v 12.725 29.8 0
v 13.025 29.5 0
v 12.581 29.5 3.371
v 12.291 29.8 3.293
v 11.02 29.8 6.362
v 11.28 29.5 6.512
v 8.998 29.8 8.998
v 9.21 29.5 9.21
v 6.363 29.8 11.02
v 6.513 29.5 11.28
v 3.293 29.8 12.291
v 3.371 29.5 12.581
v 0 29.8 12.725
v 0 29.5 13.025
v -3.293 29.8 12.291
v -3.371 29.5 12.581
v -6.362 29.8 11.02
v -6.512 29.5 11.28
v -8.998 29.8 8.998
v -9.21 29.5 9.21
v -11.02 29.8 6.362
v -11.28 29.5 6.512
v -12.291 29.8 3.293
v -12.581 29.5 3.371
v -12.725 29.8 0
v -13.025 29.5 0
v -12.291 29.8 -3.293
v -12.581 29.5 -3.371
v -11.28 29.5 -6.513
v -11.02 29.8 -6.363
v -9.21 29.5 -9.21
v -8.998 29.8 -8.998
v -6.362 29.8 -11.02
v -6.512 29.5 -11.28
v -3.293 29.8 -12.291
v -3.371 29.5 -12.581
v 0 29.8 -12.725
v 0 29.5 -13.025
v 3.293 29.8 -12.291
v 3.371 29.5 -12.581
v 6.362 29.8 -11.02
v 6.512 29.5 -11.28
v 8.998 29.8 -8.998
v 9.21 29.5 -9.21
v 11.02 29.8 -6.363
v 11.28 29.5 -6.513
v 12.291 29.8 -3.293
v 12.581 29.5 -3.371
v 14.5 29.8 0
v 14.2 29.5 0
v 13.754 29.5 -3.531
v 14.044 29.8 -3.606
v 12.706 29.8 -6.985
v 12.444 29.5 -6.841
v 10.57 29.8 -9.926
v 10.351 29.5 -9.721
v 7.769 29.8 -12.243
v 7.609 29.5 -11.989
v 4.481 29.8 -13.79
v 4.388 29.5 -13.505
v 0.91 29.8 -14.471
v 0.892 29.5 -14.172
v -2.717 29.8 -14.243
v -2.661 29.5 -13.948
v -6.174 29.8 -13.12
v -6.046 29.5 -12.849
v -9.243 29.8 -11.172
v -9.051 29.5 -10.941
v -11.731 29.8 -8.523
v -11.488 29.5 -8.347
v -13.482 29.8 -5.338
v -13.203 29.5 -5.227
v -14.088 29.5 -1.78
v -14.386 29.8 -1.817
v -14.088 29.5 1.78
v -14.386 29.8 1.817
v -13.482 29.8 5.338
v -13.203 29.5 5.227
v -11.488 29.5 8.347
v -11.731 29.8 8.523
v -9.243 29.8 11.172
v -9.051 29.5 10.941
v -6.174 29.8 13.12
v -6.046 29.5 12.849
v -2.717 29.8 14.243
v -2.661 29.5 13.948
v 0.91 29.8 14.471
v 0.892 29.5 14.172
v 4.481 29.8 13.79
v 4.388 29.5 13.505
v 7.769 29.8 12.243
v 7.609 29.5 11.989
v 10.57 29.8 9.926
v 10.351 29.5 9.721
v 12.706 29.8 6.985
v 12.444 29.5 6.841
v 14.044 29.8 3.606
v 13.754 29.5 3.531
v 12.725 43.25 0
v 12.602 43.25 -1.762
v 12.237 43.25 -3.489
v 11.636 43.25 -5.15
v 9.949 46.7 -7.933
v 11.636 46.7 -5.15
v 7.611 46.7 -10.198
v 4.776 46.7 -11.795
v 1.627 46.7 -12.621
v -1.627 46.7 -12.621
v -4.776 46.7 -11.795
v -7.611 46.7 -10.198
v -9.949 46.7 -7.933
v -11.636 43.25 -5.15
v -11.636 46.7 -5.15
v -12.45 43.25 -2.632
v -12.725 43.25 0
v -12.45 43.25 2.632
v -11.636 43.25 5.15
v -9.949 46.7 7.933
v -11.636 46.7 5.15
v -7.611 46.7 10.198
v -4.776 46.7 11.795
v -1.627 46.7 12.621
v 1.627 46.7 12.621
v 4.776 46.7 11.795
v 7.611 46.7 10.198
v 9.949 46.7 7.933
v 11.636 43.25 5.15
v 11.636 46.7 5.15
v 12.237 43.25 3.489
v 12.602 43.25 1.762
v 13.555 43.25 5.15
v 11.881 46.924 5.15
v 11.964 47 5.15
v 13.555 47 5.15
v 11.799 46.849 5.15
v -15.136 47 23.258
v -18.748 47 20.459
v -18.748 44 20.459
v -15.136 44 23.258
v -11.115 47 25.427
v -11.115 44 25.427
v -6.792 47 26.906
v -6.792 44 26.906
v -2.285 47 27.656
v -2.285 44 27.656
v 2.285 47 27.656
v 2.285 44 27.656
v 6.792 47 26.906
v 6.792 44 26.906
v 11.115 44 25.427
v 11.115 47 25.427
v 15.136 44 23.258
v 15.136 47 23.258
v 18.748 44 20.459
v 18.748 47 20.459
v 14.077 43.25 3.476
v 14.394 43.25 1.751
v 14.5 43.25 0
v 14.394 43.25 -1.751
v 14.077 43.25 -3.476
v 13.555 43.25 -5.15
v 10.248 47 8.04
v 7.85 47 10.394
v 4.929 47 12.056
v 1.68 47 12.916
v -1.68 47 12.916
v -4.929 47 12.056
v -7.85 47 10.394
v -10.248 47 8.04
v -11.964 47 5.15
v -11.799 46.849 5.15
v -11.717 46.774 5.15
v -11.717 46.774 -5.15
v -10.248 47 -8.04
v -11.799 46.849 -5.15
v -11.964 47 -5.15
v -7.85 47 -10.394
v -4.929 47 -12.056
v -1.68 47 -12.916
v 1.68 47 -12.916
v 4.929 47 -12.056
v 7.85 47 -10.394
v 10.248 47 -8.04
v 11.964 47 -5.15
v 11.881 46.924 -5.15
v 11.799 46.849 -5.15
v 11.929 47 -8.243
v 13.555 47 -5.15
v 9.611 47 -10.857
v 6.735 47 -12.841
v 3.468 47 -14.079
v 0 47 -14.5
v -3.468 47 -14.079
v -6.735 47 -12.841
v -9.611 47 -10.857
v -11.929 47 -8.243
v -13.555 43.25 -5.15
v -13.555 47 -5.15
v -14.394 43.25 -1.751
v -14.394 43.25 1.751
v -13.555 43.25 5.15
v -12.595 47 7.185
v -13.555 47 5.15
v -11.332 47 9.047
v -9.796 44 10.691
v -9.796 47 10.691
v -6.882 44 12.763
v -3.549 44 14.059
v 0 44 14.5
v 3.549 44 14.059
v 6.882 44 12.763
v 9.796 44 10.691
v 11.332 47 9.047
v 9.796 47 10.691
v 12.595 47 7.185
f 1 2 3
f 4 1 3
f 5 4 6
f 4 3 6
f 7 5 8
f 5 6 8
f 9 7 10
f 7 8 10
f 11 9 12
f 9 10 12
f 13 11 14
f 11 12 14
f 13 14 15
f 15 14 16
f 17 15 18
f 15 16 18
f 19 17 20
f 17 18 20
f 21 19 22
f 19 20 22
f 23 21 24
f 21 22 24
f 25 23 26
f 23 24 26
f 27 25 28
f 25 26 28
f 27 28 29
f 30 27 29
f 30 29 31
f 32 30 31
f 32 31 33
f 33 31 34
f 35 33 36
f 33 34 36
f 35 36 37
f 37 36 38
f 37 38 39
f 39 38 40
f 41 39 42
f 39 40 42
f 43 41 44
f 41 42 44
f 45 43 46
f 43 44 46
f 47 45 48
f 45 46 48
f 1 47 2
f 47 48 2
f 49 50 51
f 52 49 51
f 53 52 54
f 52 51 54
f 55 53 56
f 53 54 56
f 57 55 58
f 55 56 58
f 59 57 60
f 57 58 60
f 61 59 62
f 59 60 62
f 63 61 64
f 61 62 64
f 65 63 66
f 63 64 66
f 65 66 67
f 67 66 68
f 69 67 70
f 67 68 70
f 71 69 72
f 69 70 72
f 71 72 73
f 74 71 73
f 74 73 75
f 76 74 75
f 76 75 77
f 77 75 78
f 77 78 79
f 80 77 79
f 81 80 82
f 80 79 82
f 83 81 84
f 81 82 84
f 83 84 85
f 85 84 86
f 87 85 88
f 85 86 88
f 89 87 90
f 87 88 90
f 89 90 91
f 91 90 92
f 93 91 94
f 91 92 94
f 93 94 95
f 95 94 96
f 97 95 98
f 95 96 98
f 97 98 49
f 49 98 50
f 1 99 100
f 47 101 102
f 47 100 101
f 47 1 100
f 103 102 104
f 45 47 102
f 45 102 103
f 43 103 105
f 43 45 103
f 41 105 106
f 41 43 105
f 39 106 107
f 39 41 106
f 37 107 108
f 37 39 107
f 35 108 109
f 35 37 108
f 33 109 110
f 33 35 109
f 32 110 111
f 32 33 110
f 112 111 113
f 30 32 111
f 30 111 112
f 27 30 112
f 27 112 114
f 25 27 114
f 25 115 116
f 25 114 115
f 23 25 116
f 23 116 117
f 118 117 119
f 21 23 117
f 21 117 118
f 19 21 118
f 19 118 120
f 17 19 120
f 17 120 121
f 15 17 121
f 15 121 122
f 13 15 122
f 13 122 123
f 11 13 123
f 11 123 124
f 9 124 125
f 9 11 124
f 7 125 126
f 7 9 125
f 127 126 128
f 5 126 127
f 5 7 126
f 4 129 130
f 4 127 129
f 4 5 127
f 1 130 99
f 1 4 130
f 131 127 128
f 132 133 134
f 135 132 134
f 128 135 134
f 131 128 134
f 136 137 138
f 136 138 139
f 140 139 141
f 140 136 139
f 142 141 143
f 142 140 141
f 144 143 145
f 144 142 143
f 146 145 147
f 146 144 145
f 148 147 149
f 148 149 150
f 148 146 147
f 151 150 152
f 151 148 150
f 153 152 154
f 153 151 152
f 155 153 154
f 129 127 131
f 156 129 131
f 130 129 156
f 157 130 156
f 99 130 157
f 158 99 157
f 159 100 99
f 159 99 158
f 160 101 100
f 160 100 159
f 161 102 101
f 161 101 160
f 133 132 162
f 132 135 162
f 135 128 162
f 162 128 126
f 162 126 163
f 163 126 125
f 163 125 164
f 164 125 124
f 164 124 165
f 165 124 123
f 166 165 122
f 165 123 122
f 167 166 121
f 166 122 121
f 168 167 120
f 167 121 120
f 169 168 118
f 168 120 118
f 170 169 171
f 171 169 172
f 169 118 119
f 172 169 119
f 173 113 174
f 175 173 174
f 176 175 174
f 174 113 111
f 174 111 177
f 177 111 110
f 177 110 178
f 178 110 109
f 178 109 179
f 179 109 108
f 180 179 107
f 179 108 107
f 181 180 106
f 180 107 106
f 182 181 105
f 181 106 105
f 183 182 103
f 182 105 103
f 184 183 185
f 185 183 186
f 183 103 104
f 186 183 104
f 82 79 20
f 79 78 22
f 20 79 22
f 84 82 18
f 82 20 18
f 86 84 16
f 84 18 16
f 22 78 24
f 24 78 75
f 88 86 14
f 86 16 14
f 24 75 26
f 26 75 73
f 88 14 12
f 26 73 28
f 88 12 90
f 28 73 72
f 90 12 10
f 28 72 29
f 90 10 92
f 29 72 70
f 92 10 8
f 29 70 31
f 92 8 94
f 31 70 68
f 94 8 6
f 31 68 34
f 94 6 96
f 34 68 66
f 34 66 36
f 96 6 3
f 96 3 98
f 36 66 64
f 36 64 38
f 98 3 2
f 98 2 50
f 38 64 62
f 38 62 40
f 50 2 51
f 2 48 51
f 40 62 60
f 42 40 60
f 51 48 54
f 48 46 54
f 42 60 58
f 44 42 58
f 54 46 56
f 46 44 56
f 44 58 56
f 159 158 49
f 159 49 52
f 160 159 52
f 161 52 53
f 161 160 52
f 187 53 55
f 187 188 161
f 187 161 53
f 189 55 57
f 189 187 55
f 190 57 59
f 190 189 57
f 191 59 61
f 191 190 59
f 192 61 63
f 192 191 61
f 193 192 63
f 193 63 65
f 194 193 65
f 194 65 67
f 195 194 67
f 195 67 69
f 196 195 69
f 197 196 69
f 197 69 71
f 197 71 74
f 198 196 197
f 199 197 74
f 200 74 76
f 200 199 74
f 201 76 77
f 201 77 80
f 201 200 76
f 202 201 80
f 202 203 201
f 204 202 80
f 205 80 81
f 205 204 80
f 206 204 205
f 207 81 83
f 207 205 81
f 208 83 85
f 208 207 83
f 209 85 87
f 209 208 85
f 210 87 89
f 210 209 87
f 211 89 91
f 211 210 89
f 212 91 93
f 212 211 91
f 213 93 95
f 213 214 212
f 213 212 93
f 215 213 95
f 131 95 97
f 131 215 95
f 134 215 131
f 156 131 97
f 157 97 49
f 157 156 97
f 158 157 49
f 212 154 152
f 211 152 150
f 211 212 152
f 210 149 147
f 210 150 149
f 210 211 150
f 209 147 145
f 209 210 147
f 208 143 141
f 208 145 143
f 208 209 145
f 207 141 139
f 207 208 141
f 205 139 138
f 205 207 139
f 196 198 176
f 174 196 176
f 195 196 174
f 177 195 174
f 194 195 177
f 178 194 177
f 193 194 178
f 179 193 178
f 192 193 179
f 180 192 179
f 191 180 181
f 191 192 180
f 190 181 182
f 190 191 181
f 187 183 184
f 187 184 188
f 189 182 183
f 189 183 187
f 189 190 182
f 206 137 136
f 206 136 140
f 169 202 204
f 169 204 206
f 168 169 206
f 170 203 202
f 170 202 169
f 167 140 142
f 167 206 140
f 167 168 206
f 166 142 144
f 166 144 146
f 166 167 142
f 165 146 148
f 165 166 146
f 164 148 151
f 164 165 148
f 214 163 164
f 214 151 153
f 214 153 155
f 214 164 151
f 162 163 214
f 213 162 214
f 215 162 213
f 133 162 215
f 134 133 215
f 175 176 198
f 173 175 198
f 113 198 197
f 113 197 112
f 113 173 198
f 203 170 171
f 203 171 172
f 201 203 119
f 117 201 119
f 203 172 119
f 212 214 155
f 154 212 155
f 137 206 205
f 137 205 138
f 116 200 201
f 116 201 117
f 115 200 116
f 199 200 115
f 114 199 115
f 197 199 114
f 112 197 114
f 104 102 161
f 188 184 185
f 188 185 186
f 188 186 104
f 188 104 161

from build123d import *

# Parameters (mm, degrees)
SKETCH136_R             = 14.5
PAD078_DEPTH            = 17.5
PAD079_DEPTH            = 1.5
SKETCH138_R             = 12.725
POCKET051_DEPTH         = 18.501
CHAMFER_SIZE            = 0.3
CHAMFER001_SIZE         = 0.3
SKETCH_W                = 30
SKETCH_H                = 10.3
POCKET_DEPTH            = 3.75
BODY028_PLACEMENT_ANGLE = 90


with BuildPart() as part:
    # Sketch136 → Pad078 (new body)
    with BuildSketch(Plane.XY.offset(18.5)):
        Circle(SKETCH136_R)
    extrude(amount=-PAD078_DEPTH)

    # Sketch141 → Pad079 (join, symmetric)
    with BuildSketch(Plane.XY.offset(17)):
        with BuildLine():
            Line((0, 0), (18.747628, -20.459446))
            ThreePointArc((-18.747628, -20.459446), (0, -27.75), (18.747628, -20.459446))
            Line((0, 0), (-18.747628, -20.459446))
        make_face()
    extrude(amount=PAD079_DEPTH, both=True)

    # Sketch138 → Pocket051 (cut, through all)
    with BuildSketch(Plane.XY):
        Circle(SKETCH138_R)
    extrude(amount=POCKET051_DEPTH, mode=Mode.SUBTRACT)

    # Chamfer
    chamfer_edges = [part.edges().sort_by_distance(p)[0] for p in [
        (-12.725, 0, 1),
        (-14.5, 0, 1),
    ]]
    chamfer(chamfer_edges, length=CHAMFER_SIZE)

    # Chamfer001
    chamfer001_edges = [part.edges().sort_by_distance(p)[0] for p in [
        (0, -12.725, 18.5),
    ]]
    chamfer(chamfer001_edges, length=CHAMFER001_SIZE)

    # Sketch → Pocket (cut)
    with BuildSketch(Plane.XY.offset(18.5)):
        Rectangle(SKETCH_W, SKETCH_H)
    extrude(amount=-POCKET_DEPTH, mode=Mode.SUBTRACT)


with BuildPart() as part_1:
    # Body028 placement: moved
    add(part.part.moved(Location((0, 28.5, 0))).rotate(Axis((0, 28.5, 0), (-1, 0, 0)), BODY028_PLACEMENT_ANGLE))


solid = part_1.part
